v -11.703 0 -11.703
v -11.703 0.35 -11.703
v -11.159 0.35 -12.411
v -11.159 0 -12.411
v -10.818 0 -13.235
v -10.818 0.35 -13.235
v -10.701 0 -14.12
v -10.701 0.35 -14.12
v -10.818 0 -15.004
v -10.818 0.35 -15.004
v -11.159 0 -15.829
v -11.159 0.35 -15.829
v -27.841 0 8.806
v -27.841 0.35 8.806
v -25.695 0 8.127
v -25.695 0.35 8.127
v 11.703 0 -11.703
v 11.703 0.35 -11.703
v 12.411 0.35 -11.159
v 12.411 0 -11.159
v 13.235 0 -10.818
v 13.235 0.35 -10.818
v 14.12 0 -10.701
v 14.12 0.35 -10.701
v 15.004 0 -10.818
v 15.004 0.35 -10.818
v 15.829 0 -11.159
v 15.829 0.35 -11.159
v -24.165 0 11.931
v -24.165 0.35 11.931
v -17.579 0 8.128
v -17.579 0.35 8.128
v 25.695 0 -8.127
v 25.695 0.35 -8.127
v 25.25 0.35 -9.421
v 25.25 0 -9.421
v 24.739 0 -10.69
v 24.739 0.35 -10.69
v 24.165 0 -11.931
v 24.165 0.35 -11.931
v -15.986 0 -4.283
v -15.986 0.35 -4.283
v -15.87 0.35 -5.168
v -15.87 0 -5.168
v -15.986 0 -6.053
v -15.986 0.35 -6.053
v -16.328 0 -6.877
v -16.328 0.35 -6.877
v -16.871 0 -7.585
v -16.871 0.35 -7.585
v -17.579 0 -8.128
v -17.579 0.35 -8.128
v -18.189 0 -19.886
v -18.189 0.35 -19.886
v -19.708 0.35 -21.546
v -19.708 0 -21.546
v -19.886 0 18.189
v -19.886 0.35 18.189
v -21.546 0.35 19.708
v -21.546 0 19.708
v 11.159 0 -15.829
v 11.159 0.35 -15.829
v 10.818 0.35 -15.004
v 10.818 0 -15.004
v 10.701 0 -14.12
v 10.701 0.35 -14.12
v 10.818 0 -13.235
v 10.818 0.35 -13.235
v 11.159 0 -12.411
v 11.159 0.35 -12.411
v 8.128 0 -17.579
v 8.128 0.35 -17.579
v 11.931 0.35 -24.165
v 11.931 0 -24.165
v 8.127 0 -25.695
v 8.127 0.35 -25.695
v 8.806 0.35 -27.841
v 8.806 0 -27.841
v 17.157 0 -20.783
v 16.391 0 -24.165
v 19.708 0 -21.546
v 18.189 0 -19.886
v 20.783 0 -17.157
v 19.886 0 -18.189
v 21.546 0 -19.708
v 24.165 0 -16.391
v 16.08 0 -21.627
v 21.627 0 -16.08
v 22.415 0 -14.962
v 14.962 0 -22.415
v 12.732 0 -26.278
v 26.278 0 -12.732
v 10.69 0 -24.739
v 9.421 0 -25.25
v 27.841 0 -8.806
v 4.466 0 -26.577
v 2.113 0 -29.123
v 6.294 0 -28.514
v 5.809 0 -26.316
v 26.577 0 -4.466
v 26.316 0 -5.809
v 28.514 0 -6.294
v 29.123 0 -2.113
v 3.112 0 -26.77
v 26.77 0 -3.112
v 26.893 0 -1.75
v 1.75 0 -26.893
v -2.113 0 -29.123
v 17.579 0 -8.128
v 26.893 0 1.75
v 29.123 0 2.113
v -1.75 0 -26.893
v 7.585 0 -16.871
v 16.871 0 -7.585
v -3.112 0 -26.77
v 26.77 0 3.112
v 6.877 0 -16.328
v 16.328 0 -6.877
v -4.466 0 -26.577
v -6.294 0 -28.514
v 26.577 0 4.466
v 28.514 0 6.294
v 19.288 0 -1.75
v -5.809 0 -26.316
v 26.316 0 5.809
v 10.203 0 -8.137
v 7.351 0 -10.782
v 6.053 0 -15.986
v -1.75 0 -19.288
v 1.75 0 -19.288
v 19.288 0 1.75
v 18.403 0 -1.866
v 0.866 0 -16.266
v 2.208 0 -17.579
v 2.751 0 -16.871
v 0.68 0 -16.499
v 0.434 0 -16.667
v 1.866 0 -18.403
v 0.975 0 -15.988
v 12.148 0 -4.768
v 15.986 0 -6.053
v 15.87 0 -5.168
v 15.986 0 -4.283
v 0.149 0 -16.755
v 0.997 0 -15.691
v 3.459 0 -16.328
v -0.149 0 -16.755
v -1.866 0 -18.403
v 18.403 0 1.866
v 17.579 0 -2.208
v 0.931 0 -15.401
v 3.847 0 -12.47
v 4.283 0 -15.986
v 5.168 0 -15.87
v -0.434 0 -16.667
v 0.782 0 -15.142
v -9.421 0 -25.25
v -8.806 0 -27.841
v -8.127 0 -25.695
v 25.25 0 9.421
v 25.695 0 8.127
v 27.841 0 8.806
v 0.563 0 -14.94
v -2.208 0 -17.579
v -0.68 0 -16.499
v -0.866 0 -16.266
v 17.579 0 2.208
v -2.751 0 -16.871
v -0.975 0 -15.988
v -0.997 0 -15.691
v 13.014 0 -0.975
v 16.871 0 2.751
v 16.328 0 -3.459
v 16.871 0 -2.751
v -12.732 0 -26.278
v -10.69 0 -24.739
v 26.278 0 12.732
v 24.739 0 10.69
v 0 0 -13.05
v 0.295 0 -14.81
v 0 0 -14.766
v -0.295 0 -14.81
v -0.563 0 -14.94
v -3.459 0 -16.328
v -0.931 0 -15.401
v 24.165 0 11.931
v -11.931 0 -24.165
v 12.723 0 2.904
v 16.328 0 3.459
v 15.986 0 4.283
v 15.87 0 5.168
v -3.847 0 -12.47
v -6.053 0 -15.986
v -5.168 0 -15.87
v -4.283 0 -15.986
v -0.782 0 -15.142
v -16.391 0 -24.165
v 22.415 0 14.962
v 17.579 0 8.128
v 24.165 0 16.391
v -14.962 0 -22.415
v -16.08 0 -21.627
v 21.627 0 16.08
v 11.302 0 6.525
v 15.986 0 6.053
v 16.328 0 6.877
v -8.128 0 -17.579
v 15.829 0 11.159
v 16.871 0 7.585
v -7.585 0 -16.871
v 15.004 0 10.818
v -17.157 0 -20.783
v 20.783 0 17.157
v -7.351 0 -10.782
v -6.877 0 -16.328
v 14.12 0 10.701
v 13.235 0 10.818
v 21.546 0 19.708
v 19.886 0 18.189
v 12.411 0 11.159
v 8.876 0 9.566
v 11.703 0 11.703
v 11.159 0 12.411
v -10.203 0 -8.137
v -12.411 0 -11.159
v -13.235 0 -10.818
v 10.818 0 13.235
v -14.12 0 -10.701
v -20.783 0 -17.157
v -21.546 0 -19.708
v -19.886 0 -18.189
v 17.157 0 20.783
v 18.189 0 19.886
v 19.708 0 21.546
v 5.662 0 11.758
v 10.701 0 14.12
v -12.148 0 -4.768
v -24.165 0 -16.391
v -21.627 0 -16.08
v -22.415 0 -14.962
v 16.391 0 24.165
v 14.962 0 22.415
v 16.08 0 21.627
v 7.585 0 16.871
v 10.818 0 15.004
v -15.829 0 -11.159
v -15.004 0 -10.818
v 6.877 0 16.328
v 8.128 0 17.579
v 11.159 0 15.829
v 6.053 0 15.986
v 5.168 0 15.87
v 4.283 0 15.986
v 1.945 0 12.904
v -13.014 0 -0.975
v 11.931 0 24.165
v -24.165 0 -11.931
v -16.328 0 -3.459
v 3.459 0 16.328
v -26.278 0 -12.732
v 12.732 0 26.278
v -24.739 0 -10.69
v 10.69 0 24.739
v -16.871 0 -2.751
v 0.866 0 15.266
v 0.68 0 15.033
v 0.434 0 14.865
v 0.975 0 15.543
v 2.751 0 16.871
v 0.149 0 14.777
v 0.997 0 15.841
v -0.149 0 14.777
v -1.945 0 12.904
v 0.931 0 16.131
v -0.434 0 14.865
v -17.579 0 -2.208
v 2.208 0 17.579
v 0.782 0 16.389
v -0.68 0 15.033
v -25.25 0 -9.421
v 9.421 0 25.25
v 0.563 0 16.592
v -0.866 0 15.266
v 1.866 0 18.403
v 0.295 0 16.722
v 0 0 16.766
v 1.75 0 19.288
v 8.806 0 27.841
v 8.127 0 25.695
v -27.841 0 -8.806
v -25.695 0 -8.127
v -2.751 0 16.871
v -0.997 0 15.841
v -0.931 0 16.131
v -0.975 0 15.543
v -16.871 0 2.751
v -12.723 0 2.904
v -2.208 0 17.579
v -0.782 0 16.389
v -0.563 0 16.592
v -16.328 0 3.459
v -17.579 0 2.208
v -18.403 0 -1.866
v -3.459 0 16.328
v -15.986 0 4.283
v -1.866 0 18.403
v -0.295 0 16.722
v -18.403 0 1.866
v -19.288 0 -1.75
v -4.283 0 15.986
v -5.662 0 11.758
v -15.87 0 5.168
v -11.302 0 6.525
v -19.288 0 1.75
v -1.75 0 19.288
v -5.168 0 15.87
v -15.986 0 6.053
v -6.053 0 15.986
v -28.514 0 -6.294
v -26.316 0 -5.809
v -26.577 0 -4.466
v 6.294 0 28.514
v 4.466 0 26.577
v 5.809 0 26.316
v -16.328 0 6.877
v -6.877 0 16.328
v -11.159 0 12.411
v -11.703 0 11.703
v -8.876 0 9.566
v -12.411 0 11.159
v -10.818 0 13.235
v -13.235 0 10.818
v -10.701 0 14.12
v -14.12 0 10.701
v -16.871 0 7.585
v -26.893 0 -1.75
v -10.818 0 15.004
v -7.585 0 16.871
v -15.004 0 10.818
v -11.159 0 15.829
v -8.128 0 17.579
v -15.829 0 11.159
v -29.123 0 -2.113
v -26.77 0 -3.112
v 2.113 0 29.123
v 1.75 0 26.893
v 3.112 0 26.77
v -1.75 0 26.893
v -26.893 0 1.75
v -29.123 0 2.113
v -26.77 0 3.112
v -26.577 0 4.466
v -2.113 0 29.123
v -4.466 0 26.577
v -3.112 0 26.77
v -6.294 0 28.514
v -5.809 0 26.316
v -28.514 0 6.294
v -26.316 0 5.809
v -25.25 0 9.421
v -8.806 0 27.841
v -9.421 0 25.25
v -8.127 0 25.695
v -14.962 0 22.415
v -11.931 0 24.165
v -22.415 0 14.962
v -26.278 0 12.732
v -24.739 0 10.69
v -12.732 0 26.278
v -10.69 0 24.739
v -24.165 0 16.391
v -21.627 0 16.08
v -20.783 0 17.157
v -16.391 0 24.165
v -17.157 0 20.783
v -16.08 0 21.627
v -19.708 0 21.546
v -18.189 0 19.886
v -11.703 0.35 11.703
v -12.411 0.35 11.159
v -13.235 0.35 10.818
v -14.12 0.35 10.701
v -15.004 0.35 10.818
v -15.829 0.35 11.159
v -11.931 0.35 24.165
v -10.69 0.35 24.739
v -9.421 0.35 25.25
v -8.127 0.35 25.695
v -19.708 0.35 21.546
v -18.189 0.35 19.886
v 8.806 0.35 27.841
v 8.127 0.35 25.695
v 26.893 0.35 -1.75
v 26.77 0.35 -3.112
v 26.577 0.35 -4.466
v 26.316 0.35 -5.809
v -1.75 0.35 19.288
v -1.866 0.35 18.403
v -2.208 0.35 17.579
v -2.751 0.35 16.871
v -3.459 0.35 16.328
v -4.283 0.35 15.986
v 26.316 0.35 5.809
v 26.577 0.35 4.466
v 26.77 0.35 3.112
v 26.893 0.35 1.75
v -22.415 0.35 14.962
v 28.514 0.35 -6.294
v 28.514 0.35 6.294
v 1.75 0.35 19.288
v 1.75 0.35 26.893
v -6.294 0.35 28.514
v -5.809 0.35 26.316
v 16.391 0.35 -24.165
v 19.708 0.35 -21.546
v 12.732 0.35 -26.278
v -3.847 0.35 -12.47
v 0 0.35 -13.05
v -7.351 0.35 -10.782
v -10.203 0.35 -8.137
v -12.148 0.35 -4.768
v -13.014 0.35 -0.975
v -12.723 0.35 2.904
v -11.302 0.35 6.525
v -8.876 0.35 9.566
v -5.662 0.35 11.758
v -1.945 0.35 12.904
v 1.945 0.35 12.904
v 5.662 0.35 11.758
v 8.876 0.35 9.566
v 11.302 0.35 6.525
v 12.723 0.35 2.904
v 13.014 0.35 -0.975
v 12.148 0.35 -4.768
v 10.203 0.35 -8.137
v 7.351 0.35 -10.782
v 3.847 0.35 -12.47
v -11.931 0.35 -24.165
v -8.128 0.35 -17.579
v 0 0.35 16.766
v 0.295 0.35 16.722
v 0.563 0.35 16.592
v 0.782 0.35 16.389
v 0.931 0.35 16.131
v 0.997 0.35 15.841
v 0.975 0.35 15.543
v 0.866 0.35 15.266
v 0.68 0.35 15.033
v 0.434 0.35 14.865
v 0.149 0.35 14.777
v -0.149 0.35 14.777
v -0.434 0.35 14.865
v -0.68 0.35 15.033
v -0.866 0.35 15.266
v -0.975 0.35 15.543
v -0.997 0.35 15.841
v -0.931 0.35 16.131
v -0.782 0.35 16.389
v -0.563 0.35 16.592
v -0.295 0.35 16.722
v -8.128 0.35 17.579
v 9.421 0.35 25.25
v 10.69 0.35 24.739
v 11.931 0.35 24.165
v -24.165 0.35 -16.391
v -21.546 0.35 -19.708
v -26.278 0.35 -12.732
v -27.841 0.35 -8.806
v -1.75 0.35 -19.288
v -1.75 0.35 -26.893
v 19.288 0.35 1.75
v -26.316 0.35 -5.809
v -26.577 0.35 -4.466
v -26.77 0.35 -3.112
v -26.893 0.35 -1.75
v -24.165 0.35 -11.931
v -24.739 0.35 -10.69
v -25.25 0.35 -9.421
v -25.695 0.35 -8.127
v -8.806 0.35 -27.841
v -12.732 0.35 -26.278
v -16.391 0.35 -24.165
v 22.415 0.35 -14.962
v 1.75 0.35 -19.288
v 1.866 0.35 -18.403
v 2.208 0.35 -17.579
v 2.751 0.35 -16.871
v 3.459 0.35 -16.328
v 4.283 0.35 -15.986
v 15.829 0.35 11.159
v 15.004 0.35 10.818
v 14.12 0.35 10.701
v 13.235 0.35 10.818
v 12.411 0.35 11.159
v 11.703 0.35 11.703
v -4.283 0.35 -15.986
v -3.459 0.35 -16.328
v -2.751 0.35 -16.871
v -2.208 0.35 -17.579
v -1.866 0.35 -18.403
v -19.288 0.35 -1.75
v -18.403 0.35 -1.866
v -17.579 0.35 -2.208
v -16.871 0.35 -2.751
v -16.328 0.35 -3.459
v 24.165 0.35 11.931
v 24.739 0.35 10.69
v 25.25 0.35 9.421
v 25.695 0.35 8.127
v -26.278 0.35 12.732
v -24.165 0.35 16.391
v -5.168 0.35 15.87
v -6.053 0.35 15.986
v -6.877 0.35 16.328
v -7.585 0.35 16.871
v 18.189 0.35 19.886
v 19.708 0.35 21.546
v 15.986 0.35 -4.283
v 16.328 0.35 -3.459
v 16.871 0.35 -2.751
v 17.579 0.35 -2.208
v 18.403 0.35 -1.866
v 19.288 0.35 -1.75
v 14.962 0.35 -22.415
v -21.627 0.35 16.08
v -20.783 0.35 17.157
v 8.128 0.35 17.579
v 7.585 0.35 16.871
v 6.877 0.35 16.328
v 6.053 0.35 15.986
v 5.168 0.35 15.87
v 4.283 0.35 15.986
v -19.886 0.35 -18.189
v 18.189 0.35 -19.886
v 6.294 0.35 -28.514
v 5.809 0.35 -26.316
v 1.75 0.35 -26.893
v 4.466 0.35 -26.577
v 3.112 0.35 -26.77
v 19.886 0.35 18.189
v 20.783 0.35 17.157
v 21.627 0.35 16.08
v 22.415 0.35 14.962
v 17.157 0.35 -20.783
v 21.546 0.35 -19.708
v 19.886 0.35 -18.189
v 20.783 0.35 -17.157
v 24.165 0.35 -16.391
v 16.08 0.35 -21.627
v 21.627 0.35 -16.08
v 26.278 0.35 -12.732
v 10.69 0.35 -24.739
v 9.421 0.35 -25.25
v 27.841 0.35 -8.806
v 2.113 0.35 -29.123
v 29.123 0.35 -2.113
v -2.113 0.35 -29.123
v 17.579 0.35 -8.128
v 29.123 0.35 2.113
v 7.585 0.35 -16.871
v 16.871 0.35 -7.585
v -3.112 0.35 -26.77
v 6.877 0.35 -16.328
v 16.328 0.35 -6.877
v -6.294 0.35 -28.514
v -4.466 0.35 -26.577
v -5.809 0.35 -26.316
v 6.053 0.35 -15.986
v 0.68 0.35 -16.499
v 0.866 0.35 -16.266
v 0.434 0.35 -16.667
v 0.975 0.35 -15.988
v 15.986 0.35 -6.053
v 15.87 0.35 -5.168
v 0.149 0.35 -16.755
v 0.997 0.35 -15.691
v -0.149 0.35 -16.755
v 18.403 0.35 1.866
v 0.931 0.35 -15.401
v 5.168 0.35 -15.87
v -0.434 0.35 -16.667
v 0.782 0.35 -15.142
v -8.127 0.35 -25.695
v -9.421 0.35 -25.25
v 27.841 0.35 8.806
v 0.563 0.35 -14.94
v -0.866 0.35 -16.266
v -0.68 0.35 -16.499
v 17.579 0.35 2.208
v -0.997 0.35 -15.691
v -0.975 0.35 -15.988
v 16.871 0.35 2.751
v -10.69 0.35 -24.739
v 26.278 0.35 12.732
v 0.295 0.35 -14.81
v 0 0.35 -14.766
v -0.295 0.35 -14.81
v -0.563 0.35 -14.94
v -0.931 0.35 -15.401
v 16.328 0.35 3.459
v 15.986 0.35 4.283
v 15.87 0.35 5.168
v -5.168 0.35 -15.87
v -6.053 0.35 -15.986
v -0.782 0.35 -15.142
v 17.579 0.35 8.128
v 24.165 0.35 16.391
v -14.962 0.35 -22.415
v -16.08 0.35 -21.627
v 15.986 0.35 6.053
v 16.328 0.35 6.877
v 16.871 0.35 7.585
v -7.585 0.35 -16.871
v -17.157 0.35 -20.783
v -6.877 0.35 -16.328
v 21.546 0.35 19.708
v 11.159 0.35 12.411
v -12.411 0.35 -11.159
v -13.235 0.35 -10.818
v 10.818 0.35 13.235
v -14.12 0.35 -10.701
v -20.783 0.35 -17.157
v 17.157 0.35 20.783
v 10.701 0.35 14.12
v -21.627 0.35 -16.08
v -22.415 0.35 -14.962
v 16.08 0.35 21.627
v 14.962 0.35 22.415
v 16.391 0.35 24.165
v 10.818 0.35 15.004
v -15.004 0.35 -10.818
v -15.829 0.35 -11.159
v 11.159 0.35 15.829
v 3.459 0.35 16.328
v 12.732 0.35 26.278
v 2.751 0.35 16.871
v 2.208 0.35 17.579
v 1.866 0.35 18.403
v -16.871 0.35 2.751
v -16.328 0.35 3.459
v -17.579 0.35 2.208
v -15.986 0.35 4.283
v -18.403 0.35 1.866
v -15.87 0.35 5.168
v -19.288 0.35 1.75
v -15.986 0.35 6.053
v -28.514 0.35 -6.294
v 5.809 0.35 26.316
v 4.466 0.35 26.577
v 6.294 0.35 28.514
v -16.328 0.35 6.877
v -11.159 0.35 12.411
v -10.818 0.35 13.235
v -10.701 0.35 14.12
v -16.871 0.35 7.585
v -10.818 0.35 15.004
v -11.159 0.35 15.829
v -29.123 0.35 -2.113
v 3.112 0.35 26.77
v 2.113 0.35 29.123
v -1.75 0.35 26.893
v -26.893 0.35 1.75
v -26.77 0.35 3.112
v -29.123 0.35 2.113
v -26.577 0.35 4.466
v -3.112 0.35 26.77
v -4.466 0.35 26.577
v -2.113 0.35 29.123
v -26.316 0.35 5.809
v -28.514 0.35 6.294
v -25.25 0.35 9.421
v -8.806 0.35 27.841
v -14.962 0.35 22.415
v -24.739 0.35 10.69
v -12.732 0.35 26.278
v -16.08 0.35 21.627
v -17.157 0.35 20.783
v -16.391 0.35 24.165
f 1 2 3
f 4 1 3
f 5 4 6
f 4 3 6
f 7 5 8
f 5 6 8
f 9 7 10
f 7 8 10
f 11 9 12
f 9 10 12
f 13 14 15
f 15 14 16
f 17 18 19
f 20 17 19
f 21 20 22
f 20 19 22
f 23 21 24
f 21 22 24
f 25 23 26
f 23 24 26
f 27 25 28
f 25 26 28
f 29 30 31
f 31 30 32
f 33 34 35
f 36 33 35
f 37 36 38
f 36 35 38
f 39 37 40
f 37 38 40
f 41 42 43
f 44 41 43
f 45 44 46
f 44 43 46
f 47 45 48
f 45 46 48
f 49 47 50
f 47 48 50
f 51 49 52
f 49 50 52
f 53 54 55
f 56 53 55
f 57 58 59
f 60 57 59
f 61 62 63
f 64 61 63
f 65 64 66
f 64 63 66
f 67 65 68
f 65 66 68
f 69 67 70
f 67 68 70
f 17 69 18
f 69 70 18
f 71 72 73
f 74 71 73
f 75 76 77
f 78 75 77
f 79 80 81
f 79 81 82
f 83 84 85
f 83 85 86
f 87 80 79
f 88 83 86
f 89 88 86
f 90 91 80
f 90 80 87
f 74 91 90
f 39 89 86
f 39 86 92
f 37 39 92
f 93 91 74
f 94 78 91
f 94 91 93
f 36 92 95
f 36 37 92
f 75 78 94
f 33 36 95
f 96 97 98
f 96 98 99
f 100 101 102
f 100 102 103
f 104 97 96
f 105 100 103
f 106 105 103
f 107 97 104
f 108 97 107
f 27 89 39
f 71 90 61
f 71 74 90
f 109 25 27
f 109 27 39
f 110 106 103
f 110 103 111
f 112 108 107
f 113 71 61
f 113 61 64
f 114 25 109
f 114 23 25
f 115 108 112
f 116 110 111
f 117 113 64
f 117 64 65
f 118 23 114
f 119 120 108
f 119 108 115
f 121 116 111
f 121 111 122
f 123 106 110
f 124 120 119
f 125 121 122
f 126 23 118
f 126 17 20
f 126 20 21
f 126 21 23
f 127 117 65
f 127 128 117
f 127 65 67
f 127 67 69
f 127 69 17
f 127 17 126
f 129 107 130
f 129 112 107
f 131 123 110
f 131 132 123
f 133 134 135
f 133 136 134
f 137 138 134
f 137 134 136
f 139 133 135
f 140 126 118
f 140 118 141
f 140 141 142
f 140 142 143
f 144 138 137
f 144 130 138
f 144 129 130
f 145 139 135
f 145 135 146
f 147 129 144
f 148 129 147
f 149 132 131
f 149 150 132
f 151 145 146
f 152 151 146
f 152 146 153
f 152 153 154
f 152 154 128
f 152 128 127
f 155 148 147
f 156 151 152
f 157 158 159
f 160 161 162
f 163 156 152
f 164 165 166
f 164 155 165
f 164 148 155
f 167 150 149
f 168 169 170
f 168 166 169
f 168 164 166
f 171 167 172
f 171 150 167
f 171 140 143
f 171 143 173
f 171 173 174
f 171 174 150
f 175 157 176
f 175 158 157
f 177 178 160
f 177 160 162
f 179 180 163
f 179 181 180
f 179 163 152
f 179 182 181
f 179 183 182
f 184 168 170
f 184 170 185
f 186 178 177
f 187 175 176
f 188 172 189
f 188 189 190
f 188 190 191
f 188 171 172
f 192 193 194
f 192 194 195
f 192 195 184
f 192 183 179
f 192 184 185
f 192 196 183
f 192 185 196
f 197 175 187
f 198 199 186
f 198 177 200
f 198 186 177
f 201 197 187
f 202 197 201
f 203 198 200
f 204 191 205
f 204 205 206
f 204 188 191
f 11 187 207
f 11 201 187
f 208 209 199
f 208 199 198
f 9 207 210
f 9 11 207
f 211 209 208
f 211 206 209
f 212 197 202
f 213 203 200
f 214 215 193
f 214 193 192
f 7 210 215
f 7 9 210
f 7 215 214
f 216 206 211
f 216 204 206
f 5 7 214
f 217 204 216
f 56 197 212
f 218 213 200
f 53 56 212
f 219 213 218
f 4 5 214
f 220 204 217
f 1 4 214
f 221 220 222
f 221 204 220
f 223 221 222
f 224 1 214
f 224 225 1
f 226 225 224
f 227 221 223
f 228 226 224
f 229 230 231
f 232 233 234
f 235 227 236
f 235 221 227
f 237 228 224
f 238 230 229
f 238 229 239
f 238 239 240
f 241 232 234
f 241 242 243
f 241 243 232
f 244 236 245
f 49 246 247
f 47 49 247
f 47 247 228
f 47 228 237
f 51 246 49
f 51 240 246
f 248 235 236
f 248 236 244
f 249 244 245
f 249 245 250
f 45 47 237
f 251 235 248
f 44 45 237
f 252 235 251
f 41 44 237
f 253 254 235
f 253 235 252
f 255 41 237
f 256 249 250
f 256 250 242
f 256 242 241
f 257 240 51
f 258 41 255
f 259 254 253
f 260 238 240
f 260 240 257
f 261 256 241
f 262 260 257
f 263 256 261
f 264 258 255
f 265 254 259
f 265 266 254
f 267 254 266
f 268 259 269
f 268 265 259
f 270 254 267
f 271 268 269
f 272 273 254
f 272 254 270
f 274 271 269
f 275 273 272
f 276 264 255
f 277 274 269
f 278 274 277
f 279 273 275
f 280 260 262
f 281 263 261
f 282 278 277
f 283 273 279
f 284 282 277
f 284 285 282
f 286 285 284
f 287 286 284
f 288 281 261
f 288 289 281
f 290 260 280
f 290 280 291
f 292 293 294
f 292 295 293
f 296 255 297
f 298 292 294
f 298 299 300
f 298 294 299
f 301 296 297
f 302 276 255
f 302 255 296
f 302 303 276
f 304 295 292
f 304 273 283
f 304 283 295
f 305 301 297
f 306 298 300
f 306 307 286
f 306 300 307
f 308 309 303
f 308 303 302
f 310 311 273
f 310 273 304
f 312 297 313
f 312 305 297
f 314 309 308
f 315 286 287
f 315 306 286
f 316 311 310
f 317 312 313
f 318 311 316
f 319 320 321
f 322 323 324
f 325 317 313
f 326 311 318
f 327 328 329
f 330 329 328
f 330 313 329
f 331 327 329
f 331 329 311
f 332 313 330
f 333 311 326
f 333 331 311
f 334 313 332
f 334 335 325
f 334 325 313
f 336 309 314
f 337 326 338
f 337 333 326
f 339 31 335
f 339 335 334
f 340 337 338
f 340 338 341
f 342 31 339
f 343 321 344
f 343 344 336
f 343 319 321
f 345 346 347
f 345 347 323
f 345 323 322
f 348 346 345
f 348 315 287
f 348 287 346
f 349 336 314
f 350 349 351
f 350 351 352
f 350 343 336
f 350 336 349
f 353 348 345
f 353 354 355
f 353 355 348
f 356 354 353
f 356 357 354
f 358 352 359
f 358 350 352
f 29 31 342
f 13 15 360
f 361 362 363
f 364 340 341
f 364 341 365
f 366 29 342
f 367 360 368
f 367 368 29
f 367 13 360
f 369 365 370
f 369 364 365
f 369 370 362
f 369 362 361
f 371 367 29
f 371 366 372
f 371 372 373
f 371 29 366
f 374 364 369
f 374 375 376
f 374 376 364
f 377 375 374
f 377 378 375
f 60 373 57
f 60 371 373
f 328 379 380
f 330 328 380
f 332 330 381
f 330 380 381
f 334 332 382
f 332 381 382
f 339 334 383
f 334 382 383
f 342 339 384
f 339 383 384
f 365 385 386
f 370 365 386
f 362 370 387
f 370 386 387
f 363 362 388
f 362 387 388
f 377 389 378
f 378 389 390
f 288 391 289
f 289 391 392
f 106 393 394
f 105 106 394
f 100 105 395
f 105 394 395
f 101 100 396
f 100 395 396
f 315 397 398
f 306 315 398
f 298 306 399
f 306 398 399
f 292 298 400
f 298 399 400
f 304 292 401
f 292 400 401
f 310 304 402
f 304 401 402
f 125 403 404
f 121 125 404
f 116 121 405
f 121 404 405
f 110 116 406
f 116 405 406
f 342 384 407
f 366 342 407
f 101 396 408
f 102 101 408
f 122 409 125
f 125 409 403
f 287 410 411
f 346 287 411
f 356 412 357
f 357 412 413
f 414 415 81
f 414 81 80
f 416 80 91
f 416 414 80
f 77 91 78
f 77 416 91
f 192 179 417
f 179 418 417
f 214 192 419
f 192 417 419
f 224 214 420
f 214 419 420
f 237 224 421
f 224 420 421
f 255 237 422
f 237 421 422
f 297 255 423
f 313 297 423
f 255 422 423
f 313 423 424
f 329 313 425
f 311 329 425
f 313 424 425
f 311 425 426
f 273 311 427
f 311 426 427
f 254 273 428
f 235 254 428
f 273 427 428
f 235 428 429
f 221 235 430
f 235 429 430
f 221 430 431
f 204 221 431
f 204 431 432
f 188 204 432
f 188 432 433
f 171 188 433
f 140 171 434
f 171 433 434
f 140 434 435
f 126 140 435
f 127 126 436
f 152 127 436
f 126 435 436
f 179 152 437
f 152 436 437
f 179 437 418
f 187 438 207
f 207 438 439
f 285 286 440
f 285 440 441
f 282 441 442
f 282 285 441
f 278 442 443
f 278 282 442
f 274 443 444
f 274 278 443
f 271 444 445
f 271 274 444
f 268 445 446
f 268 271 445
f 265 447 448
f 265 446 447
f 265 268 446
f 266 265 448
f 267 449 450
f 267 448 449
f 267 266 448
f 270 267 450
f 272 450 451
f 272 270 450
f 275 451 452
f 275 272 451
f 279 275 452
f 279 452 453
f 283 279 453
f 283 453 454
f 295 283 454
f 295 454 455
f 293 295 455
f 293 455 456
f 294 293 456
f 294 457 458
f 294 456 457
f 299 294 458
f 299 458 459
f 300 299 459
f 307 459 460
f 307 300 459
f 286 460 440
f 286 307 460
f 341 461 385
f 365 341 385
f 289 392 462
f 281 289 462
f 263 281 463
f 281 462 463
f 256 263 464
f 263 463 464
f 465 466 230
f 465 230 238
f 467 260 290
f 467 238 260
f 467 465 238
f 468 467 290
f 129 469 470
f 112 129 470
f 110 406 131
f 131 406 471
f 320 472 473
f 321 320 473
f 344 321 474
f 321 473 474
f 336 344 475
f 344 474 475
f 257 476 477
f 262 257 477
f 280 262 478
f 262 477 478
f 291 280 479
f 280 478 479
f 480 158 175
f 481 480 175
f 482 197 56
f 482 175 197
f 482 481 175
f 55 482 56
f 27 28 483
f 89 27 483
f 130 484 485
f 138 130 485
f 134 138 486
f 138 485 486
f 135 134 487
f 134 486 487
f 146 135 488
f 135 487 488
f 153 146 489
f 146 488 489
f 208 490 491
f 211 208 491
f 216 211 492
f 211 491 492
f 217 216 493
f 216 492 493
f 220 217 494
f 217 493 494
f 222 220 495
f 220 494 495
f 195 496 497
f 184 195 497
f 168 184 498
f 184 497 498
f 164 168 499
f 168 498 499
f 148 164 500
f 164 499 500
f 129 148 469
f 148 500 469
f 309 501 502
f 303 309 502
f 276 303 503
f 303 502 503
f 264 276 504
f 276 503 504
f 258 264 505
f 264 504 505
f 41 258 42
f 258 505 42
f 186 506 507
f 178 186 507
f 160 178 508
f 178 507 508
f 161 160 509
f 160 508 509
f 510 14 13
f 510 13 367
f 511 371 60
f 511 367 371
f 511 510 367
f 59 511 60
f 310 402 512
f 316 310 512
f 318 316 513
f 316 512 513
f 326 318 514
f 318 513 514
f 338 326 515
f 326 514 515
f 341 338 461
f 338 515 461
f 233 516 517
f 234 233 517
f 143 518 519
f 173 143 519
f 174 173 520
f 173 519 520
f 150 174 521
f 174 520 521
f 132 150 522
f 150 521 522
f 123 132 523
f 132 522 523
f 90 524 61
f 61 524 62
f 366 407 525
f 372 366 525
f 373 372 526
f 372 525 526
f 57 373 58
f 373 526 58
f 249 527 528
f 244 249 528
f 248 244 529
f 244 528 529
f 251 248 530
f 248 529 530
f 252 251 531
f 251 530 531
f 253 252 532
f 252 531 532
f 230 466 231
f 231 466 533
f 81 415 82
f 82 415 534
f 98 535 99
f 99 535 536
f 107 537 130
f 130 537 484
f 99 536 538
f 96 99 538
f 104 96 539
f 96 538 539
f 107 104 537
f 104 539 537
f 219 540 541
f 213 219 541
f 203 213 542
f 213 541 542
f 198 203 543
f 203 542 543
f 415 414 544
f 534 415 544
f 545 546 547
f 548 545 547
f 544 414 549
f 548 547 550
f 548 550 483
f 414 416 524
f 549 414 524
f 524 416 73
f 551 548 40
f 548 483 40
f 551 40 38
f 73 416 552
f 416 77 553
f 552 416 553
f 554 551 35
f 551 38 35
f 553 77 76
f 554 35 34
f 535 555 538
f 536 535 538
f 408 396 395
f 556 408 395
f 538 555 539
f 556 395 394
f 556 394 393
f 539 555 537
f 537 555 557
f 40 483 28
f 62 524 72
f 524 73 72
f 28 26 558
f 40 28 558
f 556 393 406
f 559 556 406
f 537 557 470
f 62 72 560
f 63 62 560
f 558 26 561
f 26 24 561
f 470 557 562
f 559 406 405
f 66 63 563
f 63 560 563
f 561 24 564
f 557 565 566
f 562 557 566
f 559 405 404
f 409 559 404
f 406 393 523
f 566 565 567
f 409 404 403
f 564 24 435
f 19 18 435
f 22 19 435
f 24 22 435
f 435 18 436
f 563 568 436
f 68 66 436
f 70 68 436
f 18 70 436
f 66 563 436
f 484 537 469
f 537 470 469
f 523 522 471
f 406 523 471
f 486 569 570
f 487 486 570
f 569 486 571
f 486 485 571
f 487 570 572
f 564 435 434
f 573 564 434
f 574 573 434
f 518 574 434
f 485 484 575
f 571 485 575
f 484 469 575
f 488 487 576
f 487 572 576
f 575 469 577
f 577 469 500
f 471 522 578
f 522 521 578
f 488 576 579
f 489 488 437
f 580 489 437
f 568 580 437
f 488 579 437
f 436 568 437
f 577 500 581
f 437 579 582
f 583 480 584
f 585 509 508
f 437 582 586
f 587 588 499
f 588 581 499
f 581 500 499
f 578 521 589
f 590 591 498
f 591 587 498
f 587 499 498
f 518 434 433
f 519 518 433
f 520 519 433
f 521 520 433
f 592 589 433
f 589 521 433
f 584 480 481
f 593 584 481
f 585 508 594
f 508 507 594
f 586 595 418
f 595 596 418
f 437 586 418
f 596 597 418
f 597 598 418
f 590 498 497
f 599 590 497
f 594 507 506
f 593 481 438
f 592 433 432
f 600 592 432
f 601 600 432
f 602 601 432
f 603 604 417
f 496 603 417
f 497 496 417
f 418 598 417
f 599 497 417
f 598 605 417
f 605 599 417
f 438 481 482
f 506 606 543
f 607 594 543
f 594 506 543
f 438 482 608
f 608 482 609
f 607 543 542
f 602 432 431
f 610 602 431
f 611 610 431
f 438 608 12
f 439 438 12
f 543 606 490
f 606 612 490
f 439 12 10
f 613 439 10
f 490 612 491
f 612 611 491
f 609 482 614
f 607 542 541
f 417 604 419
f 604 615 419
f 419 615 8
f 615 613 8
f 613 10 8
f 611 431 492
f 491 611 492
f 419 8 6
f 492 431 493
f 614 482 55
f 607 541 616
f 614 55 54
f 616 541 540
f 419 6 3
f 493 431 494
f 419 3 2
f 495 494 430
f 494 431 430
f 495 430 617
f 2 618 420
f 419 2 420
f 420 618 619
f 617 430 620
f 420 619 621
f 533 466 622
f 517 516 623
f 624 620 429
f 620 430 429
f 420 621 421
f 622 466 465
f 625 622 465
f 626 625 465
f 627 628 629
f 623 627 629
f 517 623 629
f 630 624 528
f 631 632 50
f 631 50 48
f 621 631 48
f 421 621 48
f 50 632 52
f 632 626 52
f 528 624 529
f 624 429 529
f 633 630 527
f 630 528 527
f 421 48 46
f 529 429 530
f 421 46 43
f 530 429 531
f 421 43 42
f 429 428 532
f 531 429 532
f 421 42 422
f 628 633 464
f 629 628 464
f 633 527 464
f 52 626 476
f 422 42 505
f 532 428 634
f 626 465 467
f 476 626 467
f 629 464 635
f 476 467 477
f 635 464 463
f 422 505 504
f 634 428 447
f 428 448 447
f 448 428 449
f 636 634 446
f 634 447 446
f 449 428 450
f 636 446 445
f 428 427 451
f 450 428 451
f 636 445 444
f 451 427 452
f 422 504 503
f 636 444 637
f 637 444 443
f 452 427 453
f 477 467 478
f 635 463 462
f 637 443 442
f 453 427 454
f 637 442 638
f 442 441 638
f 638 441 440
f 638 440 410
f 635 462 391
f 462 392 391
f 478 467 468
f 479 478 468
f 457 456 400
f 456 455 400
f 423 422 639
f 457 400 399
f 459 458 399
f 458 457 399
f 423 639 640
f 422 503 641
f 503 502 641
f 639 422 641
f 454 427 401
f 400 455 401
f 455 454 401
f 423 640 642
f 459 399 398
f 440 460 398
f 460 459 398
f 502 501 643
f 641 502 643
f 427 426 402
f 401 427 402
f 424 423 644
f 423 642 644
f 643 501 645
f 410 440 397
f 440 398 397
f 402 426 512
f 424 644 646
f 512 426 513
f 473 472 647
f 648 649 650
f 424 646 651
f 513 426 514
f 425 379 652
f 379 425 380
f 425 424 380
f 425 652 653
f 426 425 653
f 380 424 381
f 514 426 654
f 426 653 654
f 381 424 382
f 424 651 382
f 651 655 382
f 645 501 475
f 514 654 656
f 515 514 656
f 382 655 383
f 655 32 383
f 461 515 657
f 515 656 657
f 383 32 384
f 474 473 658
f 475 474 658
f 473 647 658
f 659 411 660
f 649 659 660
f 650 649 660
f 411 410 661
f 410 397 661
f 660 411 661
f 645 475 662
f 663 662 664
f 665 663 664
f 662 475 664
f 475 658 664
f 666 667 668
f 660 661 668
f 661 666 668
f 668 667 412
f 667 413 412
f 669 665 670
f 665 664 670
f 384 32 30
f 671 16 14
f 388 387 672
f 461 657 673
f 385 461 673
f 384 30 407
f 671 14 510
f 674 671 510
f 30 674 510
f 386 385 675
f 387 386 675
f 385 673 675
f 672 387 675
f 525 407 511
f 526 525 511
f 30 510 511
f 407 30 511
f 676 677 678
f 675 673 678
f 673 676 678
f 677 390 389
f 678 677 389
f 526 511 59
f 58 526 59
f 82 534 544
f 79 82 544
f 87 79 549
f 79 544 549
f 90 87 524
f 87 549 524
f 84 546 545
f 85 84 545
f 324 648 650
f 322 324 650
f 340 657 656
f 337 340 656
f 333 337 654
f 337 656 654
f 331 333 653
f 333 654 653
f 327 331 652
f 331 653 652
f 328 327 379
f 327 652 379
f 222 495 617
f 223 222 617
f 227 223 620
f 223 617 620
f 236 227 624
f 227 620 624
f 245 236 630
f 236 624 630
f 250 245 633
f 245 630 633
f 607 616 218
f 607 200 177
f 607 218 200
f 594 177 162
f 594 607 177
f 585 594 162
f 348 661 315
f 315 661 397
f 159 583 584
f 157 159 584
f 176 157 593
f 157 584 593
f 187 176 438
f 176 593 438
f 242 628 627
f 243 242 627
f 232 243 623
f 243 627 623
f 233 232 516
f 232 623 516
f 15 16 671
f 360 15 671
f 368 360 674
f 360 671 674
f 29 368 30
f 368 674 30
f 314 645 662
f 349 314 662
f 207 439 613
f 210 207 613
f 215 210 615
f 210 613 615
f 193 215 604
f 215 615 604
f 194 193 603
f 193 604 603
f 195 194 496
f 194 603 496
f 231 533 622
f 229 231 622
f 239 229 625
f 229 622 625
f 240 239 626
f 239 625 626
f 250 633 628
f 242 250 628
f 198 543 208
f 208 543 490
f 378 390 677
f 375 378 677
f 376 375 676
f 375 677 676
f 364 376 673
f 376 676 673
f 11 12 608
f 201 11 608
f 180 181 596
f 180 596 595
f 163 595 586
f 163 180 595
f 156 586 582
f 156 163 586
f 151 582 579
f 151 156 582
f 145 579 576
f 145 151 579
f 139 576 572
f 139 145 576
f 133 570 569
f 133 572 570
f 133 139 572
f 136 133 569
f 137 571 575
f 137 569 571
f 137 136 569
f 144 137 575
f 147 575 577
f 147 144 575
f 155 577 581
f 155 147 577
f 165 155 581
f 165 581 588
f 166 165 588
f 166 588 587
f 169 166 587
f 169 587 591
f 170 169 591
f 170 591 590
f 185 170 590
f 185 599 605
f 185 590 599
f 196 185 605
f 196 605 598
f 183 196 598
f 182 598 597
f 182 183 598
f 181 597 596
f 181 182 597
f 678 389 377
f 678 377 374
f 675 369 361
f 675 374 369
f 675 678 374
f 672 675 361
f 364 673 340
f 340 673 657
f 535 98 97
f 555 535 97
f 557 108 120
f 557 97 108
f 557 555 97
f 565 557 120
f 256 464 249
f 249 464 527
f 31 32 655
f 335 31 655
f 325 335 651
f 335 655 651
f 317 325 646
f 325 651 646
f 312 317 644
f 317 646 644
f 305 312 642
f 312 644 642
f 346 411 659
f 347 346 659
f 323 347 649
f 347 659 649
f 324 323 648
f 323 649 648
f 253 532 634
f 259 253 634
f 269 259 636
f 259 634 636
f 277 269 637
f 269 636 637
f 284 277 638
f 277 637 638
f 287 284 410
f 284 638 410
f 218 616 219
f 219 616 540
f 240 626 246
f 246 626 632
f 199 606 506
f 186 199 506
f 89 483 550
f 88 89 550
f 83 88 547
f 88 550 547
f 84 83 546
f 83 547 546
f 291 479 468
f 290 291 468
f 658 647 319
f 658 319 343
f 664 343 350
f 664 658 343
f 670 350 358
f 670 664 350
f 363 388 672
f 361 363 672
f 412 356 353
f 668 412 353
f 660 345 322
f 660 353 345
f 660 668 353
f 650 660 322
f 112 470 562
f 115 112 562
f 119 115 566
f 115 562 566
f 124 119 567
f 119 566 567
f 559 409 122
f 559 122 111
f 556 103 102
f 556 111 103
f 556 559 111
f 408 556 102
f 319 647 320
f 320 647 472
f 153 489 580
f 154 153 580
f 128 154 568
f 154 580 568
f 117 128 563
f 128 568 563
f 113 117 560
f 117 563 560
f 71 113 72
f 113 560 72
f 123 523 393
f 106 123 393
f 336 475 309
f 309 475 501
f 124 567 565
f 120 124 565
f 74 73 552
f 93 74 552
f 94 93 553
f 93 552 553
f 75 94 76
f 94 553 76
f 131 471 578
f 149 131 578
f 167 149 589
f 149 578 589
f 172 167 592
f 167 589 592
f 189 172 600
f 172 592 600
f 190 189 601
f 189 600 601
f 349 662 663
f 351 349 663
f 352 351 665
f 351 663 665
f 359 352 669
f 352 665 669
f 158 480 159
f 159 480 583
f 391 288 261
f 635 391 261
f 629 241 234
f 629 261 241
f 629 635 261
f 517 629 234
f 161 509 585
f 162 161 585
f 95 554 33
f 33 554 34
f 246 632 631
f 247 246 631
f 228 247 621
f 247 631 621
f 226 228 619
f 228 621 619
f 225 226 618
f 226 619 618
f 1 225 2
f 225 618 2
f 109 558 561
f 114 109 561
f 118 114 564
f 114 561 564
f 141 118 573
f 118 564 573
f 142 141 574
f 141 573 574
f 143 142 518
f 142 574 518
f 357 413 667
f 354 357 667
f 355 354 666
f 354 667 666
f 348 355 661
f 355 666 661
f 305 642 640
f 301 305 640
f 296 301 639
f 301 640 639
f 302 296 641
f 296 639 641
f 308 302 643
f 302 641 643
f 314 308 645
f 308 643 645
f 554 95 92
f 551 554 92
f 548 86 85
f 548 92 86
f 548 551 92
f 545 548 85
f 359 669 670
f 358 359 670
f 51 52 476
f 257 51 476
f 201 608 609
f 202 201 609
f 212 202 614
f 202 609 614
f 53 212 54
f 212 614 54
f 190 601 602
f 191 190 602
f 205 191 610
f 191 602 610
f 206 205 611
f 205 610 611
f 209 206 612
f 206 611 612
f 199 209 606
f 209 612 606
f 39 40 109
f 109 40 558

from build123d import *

# Parameters (mm, degrees)
SKETCH2_W               = 16.15
SKETCH2_H               = 0.35
CUT_EXTRUDE5_DEPTH      = 42.296519224
CIRPATTERN1_COUNT       = 12
CUT_EXTRUDE6_DEPTH      = 42.296519224
CUT_EXTRUDE6_DEPTH_BACK = 42.296519224
SKETCH5_R               = 1


with BuildPart() as part:
    # Sketch2 → Revolve2 (revolve)
    with BuildSketch(Plane.XY, mode=Mode.PRIVATE) as revolve2_sk:
        with Locations((21.125, 0.175)):
            Rectangle(SKETCH2_W, SKETCH2_H)
    revolve(revolve2_sk.sketch.rotate(Axis((0, 0, 0), (0, 1, 0)), 90), axis=Axis((0, 0, 0), (0, 1, 0)))

    # Sketch3 → Cut-Extrude5 (cut, symmetric)
    with BuildSketch(Plane(origin=(0, 0.35, 0), x_dir=(1, 0, 0), z_dir=(0, 1, 0))):
        with BuildLine():
            Line((-1.75, 19.287735518), (-1.75, 26.893121797))
            ThreePointArc((-1.75, 26.893121797), (-3.790597968, 26.682088881), (-5.809231237, 26.316446045))
            Line((-5.809231237, 26.316446045), (-6.29423199, 28.51355193))
            ThreePointArc((-6.29423199, 28.51355193), (-7.557516117, 28.205034128), (-8.805811164, 27.840576318))
            Line((-8.805811164, 27.840576318), (-8.127281194, 25.695326431))
            ThreePointArc((-8.127281194, 25.695326431), (-10.058290305, 25.002665781), (-11.931016442, 24.165126663))
            Line((-11.931016442, 24.165126663), (-8.128323302, 17.57866894))
            ThreePointArc((-8.128323302, 17.57866894), (-6.476196083, 16.129792255), (-4.283455194, 15.986072426))
            ThreePointArc((-4.283455194, 15.986072426), (-2.456345798, 17.206907895), (-1.75, 19.287735518))
        make_face()
    cut_extrude5 = extrude(amount=CUT_EXTRUDE5_DEPTH, both=True, mode=Mode.SUBTRACT)

    # CirPattern1: Cut-Extrude5 ×12 about axis
    cirpattern1_axis = Axis((0, 0, 0), (0, 1, 0))
    for i in range(1, CIRPATTERN1_COUNT):
        add(cut_extrude5.rotate(cirpattern1_axis, i * 360 / CIRPATTERN1_COUNT), mode=Mode.SUBTRACT)

    # Sketch5 → Cut-Extrude6 (cut, two sides: drawn at the far end of the back side and taken through both)
    with BuildSketch(Plane(origin=(0, 0.35, 0), x_dir=(1, 0, 0), z_dir=(0, 1, 0)).offset(-CUT_EXTRUDE6_DEPTH_BACK)):
        with Locations(Location((0, 15.765930428, 0), (0, 0, 270))):
            Circle(SKETCH5_R)
        with Locations(Location((0, -15.765930428, 0), (0, 0, 270))):
            Circle(SKETCH5_R)
    extrude(amount=CUT_EXTRUDE6_DEPTH + CUT_EXTRUDE6_DEPTH_BACK, mode=Mode.SUBTRACT)


solid = part.part
